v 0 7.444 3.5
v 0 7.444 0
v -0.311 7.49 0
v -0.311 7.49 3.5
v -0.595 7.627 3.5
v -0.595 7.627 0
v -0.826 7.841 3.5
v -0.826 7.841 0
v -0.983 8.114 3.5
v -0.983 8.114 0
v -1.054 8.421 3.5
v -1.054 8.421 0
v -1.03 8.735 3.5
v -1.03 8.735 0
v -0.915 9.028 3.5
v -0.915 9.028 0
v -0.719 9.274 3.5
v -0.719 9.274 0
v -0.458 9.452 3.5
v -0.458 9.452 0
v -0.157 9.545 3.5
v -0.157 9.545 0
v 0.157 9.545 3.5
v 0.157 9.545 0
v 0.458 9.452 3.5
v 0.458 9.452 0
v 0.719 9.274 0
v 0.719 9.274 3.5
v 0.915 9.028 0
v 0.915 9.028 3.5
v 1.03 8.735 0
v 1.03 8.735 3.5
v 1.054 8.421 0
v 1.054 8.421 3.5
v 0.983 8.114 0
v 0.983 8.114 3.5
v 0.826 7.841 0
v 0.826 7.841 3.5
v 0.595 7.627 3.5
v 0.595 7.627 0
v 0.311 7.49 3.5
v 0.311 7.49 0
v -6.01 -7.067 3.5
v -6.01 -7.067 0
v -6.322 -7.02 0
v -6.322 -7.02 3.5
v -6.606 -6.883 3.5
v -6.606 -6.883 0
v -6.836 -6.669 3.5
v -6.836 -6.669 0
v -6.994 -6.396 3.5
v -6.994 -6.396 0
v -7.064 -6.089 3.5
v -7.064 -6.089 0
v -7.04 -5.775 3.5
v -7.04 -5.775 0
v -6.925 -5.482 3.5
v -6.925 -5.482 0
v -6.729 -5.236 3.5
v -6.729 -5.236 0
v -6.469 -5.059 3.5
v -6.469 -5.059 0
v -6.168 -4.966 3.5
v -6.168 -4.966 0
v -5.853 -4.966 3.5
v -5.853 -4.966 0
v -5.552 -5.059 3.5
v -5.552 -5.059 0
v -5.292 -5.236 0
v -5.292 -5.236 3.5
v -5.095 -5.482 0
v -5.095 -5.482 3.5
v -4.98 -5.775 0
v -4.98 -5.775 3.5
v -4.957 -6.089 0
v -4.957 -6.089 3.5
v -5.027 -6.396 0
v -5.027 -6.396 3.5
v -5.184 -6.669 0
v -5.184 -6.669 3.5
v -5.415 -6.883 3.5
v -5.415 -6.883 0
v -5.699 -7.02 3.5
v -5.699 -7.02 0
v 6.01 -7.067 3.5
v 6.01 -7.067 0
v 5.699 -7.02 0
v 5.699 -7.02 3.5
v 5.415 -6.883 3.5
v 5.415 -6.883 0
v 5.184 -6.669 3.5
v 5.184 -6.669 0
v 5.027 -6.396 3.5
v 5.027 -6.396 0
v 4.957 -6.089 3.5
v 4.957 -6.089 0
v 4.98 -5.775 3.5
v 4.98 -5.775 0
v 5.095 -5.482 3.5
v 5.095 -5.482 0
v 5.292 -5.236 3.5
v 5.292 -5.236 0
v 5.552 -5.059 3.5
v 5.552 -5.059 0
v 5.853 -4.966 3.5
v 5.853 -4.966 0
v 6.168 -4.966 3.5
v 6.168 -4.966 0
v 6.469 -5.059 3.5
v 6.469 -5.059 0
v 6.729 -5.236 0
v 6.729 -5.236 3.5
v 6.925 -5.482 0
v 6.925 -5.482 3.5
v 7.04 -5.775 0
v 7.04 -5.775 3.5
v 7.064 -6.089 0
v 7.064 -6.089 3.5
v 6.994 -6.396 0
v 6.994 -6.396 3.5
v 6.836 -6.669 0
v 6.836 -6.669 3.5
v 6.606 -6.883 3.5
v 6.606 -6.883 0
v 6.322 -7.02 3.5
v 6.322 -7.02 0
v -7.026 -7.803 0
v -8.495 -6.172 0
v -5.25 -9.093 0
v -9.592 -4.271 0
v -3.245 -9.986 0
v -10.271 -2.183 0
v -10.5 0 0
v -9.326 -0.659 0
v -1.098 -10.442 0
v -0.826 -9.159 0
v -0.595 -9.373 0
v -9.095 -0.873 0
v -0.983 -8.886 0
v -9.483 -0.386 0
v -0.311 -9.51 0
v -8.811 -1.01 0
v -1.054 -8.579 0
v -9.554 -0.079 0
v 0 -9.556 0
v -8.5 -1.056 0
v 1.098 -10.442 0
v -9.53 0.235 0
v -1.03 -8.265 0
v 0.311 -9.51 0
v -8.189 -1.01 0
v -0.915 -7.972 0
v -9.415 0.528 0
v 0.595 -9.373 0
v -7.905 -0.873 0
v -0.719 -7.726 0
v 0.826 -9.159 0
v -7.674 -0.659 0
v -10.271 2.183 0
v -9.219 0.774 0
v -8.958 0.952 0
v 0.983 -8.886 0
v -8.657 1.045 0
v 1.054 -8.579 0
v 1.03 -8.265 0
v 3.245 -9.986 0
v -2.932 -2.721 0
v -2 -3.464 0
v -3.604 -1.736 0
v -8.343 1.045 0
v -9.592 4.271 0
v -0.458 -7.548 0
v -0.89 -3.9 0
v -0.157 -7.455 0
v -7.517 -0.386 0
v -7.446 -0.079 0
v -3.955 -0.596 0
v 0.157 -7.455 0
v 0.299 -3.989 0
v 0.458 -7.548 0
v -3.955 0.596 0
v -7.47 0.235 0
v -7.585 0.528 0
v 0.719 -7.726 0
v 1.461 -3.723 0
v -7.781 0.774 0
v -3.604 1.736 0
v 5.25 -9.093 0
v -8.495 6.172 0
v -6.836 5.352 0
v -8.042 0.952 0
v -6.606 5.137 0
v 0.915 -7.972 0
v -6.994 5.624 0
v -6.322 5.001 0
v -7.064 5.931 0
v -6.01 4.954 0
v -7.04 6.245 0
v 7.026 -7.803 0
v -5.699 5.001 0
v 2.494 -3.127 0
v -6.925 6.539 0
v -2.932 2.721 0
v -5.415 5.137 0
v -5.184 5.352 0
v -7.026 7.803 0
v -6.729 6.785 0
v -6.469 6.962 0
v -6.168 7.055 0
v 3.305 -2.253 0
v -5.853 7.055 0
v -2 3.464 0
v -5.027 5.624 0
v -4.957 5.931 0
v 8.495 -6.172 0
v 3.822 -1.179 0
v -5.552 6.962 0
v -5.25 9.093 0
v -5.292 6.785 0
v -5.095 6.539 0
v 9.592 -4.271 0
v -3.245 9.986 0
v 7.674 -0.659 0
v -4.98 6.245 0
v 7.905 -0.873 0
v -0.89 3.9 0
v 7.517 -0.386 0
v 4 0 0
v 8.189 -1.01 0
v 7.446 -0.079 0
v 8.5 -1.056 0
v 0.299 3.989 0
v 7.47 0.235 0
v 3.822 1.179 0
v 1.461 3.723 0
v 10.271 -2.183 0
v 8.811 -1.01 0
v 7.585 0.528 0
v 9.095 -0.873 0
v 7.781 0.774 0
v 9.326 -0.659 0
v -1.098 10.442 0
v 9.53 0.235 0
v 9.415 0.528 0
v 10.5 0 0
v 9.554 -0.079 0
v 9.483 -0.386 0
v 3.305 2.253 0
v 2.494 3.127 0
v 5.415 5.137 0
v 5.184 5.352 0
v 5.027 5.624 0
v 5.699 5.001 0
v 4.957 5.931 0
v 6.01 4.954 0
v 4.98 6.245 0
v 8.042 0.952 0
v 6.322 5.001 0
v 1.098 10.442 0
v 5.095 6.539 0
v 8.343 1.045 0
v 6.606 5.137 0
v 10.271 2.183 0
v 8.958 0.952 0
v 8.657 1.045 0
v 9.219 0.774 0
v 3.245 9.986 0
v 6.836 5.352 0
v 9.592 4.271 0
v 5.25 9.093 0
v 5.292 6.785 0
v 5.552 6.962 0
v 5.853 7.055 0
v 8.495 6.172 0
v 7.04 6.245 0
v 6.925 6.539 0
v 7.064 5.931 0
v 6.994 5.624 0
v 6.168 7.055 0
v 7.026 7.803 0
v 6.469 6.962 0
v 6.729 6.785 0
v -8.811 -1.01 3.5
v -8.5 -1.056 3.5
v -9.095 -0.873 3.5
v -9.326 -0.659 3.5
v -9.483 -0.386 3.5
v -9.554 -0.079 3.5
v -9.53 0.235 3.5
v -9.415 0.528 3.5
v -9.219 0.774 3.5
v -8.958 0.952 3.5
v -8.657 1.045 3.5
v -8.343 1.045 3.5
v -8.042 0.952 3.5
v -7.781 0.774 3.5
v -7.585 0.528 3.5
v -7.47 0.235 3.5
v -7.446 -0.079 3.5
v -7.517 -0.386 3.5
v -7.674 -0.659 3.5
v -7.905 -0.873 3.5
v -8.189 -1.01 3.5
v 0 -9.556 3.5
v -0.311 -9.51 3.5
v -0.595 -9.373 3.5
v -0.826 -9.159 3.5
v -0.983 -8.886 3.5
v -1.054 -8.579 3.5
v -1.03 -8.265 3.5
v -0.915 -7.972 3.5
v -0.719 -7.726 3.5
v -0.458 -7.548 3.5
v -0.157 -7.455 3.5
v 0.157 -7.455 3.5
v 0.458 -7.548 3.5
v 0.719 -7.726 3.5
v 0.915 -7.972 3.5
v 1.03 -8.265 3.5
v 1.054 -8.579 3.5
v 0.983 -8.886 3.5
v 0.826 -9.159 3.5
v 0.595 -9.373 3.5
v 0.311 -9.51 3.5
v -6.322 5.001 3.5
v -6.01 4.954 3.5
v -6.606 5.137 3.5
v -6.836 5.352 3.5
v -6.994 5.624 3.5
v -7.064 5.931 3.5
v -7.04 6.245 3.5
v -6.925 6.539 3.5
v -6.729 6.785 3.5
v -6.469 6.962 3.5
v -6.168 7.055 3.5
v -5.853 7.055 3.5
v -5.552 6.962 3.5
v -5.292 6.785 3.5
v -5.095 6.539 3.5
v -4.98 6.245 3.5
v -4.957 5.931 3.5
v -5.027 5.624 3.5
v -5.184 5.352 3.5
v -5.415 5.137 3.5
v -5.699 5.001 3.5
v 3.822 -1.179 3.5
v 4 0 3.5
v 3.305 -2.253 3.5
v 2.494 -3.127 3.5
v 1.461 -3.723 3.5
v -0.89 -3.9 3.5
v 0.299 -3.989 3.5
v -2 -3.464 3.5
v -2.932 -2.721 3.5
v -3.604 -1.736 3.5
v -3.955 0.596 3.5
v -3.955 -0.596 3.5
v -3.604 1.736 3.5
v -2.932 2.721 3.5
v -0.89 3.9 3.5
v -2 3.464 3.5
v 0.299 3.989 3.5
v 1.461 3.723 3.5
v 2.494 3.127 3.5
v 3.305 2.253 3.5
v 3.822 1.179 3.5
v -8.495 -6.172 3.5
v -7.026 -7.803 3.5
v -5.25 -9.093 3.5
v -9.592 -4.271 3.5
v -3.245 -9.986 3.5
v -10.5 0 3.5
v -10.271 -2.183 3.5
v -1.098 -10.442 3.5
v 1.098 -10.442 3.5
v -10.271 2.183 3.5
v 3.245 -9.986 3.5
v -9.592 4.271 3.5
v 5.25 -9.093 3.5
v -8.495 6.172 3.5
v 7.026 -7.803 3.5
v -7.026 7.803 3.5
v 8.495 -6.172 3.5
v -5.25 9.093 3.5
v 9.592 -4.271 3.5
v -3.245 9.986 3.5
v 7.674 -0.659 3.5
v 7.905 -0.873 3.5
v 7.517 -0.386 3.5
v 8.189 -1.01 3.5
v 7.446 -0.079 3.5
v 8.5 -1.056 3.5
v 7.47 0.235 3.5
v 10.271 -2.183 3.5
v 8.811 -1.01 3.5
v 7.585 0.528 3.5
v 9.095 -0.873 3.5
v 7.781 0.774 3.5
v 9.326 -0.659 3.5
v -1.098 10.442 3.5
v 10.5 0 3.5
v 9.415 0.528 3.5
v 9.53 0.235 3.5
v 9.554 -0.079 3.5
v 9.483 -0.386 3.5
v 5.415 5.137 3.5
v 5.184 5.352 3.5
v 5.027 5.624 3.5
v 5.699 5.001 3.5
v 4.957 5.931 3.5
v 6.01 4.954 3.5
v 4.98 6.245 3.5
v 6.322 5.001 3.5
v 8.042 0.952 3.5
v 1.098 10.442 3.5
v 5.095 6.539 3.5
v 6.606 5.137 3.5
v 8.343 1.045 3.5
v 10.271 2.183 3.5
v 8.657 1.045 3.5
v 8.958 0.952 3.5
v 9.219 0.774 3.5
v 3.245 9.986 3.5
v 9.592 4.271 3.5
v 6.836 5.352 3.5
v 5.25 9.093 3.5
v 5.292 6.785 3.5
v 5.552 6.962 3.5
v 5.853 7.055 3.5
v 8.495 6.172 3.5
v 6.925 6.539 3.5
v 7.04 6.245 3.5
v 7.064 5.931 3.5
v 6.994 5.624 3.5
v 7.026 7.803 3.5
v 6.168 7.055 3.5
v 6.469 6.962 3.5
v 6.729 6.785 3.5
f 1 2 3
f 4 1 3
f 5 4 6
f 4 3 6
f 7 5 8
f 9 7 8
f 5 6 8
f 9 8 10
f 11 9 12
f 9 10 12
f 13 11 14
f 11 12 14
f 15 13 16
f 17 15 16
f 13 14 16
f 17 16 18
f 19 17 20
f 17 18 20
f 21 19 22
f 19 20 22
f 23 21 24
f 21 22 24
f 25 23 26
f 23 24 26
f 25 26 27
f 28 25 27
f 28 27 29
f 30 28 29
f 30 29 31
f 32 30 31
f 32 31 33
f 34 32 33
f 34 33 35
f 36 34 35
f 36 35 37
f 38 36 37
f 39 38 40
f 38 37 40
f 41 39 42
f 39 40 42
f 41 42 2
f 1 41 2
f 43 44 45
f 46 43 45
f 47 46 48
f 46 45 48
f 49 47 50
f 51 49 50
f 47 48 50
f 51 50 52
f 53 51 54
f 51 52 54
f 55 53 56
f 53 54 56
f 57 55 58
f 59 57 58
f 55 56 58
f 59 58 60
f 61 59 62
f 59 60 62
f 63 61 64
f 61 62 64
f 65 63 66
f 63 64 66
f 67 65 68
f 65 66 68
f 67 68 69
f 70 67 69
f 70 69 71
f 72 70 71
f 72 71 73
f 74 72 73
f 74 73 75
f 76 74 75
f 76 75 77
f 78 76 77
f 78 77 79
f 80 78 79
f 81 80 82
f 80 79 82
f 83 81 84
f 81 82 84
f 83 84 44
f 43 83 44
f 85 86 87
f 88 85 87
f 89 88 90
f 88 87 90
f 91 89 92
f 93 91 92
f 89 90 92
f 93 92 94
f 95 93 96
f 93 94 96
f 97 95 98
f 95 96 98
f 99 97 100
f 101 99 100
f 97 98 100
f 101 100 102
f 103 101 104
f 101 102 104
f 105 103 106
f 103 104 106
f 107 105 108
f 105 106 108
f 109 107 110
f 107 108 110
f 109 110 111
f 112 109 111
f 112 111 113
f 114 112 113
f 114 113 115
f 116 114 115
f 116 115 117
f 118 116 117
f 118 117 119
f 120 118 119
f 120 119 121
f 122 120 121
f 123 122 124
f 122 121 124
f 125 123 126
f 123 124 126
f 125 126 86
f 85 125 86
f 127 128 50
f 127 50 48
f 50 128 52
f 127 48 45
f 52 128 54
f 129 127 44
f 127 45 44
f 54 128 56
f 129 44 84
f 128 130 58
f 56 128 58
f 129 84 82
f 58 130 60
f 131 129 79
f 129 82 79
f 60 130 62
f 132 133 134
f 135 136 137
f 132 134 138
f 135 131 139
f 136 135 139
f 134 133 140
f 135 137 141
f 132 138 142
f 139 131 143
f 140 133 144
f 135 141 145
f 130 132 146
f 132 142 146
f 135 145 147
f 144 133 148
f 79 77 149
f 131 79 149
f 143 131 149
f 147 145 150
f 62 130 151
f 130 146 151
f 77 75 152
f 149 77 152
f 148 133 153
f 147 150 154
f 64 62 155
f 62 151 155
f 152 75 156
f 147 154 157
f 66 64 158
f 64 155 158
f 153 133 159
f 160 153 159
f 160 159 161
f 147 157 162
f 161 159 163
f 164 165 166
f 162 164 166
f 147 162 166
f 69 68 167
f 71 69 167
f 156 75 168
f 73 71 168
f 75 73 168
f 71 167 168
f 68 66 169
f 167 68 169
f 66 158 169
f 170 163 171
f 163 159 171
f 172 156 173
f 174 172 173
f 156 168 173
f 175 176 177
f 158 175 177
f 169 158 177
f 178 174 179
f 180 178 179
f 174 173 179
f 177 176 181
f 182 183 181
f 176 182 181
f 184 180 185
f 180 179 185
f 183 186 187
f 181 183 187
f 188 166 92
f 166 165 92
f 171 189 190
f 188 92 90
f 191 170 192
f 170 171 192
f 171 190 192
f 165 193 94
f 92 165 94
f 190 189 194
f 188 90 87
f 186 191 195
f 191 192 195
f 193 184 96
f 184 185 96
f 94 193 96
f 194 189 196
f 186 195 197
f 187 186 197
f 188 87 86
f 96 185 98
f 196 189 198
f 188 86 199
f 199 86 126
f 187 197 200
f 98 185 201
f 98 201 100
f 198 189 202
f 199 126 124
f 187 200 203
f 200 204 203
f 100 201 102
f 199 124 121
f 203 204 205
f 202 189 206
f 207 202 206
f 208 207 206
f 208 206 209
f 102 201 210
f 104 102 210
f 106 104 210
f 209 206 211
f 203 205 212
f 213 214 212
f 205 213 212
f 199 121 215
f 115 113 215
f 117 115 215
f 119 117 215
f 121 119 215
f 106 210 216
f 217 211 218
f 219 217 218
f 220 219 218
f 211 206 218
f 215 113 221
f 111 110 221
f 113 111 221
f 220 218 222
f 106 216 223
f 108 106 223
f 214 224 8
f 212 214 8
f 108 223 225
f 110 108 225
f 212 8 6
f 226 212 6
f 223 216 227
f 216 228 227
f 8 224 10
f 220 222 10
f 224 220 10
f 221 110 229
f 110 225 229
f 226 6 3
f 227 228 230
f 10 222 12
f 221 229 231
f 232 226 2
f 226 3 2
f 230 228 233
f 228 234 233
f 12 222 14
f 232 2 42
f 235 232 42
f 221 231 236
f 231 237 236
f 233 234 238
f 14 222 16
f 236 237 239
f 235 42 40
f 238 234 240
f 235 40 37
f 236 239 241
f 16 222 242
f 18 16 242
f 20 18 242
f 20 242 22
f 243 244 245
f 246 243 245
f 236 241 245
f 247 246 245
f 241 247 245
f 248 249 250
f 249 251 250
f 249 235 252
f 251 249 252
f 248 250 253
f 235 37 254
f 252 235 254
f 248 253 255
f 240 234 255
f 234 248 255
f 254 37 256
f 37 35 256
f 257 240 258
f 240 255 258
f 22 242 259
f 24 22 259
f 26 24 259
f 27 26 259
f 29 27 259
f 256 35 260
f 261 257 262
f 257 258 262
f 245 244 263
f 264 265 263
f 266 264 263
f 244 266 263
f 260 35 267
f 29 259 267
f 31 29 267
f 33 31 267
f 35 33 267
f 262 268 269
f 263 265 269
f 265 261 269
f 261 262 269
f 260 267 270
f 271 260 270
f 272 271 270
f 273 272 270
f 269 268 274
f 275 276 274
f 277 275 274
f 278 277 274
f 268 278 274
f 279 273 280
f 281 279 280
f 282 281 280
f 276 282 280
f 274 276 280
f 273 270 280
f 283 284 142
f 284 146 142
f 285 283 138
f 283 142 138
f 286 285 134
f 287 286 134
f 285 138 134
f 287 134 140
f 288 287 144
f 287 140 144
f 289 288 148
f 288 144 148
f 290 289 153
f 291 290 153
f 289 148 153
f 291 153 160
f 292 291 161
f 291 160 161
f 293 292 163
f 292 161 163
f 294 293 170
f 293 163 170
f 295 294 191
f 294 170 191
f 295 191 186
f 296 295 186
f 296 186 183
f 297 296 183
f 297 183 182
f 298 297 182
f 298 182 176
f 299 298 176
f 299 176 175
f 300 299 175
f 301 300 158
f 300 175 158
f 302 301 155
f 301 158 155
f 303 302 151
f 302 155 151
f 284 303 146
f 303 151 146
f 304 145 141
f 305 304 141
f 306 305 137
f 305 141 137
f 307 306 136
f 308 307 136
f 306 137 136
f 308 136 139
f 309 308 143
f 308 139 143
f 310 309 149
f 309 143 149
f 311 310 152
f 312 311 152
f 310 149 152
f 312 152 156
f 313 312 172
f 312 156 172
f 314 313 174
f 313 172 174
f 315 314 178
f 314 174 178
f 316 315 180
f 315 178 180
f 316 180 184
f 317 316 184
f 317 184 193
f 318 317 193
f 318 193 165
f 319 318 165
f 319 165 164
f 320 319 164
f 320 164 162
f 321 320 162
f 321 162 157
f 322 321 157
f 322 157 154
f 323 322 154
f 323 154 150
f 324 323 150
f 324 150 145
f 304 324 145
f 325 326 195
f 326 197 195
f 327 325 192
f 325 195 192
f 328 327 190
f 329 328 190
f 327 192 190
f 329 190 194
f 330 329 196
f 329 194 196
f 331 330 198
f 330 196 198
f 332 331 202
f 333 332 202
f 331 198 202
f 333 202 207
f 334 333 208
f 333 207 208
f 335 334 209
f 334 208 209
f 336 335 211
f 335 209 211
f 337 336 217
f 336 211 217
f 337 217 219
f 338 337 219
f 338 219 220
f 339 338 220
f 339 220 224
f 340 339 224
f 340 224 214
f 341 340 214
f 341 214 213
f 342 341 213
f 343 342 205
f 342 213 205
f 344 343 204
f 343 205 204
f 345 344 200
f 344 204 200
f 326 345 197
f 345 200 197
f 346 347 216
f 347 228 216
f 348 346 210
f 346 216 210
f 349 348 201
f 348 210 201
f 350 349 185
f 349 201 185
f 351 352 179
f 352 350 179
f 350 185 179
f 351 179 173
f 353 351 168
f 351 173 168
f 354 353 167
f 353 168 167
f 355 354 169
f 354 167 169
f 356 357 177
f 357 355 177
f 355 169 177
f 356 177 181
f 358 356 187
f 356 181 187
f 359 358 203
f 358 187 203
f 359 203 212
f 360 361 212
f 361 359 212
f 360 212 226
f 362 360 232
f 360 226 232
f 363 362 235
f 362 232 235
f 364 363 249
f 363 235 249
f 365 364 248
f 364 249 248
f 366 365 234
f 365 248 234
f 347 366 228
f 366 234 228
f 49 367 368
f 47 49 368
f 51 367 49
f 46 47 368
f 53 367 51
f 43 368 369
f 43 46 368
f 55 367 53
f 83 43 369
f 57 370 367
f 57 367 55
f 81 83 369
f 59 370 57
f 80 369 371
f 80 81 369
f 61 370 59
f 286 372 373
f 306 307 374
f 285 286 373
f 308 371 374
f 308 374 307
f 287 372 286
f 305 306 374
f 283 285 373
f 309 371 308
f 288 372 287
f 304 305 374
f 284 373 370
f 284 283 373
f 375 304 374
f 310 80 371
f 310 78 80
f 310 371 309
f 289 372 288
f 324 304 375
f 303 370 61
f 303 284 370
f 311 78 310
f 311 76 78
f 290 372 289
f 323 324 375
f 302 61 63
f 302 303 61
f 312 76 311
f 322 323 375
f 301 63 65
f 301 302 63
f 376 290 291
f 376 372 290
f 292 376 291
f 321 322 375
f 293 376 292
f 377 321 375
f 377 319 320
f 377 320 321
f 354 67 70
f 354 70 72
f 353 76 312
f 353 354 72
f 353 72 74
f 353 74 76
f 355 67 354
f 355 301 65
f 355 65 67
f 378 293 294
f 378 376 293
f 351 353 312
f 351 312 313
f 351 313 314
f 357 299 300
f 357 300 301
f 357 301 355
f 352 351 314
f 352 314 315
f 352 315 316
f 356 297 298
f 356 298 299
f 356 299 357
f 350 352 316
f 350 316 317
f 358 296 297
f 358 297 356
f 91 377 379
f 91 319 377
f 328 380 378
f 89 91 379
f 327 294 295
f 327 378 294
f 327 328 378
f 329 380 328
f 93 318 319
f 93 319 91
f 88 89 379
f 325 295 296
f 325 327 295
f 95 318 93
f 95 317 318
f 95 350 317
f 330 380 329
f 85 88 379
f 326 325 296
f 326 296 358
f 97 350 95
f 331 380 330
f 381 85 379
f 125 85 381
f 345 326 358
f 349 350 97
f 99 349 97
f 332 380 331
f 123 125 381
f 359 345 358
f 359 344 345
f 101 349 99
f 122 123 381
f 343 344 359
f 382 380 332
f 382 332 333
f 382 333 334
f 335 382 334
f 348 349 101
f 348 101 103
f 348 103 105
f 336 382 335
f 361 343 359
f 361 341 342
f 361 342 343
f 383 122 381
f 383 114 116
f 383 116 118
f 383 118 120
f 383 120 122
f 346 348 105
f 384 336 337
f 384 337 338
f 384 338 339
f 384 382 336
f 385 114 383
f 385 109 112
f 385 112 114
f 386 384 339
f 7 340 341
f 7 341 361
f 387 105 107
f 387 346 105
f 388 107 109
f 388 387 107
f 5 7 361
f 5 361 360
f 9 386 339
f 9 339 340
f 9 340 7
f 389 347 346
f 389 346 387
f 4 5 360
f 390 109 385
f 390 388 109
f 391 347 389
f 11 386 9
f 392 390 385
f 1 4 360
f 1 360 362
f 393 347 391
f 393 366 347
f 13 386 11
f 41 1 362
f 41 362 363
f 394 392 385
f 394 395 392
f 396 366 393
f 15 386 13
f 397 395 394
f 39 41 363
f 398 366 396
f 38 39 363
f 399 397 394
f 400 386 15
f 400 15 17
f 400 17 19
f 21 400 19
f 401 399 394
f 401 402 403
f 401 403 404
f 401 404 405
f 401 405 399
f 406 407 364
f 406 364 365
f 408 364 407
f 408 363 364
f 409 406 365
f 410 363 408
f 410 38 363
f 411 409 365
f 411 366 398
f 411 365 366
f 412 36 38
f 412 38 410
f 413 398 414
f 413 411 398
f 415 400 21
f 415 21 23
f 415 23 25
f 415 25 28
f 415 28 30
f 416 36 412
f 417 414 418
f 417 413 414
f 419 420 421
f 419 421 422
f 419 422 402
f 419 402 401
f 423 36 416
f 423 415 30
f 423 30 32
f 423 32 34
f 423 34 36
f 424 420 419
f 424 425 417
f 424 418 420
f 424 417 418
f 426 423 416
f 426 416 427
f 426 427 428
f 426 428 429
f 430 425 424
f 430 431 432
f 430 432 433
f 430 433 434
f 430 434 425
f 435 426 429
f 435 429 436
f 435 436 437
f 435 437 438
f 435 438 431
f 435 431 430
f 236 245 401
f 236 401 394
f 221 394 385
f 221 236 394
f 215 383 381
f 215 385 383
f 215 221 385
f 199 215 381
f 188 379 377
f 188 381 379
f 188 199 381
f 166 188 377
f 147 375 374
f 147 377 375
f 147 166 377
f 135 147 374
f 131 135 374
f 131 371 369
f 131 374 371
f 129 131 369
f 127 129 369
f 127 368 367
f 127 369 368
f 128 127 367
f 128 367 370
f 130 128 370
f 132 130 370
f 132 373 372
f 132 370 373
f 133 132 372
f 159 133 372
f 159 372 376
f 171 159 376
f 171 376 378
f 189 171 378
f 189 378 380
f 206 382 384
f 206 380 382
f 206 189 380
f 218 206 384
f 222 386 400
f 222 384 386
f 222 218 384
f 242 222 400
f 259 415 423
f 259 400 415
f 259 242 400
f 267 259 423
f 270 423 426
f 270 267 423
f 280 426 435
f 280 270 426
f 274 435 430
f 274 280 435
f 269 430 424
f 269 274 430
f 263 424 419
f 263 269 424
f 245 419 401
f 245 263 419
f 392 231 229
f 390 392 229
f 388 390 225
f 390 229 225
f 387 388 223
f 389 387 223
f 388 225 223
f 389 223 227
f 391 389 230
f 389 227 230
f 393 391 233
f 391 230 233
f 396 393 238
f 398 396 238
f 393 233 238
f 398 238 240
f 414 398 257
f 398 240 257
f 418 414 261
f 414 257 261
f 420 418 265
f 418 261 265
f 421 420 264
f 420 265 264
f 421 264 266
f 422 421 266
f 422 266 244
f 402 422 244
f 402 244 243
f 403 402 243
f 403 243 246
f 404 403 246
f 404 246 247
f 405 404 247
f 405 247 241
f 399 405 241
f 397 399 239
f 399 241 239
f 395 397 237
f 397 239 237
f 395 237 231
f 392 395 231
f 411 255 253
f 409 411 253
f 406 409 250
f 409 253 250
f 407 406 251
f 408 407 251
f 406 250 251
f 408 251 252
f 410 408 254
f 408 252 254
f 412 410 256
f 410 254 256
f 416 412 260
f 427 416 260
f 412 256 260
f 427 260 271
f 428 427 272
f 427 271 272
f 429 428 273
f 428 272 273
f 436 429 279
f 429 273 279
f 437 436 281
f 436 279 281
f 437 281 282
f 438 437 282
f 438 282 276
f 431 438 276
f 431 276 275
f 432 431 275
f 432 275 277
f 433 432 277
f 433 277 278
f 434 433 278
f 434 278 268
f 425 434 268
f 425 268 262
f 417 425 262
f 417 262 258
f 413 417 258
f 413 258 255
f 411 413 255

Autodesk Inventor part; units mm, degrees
ref_plane "YZ Plane" through (0, 0, 0) normal (1, 0, 0) x (0, 1, 0)
ref_plane "XZ Plane" through (0, 0, 0) normal (0, 1, 0) x (-1, 0, 0)
ref_plane "XY Plane" through (0, 0, 0) normal (0, 0, 1) x (1, 0, 0)
sketch "スケッチ1" plane through (0, 0, 0) normal (0, 0, 1) x (1, 0, 0)
  circle A0 centre (0, 0) radius 10.5
  circle A1 centre (0, 0) radius 4
  dimension "d0" = 21
  dimension "d1" = 8
extrude "押し出し1" add sketch "スケッチ1" along normal blind 3.5
sketch "スケッチ2" plane through (0, 0, 3.5) normal (0, 0, 1) x (1, 0, 0)
  line L0 (0, 0) -> (0, 10.5) construction
  circle A0 centre (0, 0) radius 10.5 projected
  point P0 (0, 8.5)
  point P1 (-6.0104, 6.0104)
  point P2 (-8.5, 0)
  point P3 (-6.0104, -6.0104)
  point P4 (0, -8.5)
  point P5 (6.0104, -6.0104)
  point P6 (8.5, 0)
  point P7 (6.0104, 6.0104)
  dimension "d4" = 8.5
  dimension "d7" = 360
hole "穴1" at (0, 8.5, 3.5) at (-6.0104, 6.0104, 3.5) at (-8.5, 0, 3.5) at (-6.0104, -6.0104, 3.5) at (0, -8.5, 3.5) at (6.0104, -6.0104, 3.5) at (8.5, 0, 3.5) at (6.0104, 6.0104, 3.5) direction (0, 0, -1) diameter 2.113 end through all thread size "M2.6x0.45" class "6H" standard "ISO Metric profile"
properties part number "free_horn" material "アルミニウム 6061"
